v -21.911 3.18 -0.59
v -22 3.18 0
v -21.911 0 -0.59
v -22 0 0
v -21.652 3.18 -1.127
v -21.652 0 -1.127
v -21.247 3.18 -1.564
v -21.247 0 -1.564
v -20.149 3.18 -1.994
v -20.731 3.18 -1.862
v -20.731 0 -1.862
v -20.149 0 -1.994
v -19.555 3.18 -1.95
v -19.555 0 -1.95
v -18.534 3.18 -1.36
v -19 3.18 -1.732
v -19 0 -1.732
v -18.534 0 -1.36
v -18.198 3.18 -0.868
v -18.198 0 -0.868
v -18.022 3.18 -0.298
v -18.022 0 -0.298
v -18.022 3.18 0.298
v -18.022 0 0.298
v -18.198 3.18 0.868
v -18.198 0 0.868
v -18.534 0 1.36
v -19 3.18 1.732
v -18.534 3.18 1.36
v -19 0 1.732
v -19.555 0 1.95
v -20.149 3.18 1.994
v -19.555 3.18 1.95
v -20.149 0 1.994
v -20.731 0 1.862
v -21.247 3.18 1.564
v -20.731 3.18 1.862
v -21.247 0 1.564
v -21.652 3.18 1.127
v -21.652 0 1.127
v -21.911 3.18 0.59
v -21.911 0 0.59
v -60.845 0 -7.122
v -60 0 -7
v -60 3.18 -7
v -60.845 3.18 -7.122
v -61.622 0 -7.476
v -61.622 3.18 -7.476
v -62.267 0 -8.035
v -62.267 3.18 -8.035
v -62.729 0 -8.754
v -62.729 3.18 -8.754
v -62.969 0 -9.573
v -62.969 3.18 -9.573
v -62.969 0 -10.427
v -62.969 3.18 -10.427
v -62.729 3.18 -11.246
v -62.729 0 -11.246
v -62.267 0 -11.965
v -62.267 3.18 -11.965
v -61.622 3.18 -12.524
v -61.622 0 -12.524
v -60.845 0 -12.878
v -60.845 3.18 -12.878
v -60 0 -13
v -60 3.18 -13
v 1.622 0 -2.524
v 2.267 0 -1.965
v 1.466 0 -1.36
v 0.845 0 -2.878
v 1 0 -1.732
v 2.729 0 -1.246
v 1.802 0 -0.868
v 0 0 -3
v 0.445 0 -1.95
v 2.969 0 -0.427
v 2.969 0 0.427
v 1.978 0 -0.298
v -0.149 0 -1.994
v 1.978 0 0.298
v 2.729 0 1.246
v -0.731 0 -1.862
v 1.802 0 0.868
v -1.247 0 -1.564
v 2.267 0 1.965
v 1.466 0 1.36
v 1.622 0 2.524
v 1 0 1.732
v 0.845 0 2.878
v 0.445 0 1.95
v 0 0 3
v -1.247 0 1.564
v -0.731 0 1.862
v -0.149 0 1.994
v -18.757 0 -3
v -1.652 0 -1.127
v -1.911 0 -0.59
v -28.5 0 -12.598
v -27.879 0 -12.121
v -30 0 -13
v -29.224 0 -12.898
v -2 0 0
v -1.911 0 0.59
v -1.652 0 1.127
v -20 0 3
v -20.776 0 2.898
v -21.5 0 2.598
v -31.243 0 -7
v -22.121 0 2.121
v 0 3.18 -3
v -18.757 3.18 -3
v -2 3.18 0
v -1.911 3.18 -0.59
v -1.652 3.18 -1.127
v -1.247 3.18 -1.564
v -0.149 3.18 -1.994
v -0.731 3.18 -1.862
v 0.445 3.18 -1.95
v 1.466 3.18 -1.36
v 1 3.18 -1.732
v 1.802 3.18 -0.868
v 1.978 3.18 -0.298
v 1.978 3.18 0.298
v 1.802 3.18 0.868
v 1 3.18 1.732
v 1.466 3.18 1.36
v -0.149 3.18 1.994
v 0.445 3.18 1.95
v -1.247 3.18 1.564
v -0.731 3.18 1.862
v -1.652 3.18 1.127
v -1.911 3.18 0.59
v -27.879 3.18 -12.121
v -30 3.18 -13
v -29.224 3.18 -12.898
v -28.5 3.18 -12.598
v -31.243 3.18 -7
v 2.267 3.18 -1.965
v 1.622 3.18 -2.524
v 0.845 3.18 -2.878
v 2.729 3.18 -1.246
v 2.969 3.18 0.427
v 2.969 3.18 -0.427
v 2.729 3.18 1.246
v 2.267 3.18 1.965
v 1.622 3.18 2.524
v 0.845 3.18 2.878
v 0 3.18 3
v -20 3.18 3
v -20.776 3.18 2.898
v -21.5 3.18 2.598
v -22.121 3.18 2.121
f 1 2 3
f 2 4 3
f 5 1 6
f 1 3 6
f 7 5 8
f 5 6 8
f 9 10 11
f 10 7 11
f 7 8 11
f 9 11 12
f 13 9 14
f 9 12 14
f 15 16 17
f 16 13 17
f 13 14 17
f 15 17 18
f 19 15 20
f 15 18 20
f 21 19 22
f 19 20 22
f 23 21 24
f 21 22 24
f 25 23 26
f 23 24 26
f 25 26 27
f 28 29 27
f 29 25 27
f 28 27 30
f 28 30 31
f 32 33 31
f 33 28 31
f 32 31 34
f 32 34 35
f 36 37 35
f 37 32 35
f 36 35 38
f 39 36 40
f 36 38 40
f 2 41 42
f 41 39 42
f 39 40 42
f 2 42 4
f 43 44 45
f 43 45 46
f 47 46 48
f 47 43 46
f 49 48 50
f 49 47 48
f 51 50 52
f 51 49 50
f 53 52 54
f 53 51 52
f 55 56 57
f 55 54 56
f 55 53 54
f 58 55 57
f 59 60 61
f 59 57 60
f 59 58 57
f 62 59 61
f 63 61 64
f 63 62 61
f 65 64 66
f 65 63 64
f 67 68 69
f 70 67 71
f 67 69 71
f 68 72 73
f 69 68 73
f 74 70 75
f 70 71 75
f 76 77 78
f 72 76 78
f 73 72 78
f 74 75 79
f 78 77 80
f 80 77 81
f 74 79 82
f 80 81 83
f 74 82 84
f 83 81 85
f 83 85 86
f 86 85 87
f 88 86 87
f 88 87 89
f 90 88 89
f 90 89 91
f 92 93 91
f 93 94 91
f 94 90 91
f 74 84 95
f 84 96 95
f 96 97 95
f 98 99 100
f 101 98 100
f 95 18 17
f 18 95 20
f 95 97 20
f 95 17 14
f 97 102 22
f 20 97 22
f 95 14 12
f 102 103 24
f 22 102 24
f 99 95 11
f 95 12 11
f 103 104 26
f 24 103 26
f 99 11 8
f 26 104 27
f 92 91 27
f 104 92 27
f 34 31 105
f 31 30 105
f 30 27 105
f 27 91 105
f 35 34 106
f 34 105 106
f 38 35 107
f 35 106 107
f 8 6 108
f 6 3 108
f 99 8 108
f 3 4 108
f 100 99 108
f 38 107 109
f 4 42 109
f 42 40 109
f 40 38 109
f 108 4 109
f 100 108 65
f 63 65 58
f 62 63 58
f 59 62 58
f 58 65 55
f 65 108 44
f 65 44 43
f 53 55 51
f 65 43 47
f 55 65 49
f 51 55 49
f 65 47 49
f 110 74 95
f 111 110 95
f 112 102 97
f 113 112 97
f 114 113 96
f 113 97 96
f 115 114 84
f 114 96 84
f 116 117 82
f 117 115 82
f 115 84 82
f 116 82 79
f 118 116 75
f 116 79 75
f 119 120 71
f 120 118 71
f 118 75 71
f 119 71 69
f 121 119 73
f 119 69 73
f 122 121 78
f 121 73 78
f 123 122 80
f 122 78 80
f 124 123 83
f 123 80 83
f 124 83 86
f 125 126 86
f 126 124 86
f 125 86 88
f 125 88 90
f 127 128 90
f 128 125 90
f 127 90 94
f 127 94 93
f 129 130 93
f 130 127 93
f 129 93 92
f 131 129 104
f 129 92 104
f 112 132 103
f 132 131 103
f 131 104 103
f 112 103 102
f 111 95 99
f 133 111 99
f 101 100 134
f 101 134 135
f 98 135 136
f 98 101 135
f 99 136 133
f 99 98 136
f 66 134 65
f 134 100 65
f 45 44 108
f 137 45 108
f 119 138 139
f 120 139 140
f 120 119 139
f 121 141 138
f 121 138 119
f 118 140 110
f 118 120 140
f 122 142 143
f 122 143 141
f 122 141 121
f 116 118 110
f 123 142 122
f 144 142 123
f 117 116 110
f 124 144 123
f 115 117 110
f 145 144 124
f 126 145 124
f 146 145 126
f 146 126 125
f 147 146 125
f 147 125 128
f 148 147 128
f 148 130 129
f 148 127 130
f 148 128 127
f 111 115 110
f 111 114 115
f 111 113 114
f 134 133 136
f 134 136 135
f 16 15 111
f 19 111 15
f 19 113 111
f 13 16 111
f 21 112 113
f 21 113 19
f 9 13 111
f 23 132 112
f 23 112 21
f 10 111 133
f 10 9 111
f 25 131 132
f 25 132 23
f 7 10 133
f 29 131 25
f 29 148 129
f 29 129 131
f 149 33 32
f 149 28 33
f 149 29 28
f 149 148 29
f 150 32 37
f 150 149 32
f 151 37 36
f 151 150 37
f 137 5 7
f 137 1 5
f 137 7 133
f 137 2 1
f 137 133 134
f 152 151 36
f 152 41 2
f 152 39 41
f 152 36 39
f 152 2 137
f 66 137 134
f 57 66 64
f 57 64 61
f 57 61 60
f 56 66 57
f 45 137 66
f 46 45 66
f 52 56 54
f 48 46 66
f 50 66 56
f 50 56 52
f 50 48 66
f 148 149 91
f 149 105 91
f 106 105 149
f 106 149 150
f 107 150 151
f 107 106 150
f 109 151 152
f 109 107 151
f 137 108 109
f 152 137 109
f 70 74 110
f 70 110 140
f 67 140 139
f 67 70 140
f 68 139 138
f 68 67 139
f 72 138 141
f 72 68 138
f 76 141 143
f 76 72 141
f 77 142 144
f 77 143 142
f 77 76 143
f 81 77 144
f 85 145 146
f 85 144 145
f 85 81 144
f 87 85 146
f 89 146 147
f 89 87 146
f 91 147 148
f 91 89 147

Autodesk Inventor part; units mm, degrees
ref_plane "YZ Plane" through (0, 0, 0) normal (1, 0, 0) x (0, 1, 0)
ref_plane "XZ Plane" through (0, 0, 0) normal (0, 1, 0) x (-1, 0, 0)
ref_plane "XY Plane" through (0, 0, 0) normal (0, 0, 1) x (1, 0, 0)
sketch "Boceto1" plane through (0, 0, 0) normal (0, 1, 0) x (-1, 0, 0)
  circle A0 centre (0, 0) radius 2
  line L0 (0, 0) -> (20, 0) construction
  line L1 (0, -3) -> (20, -3)
  line L2 (20, 3) -> (0, 3)
  arc A1 (0, 3) -> (0, -3) centre (0, 0) ccw
  arc A2 (20, -3) -> (20, 3) centre (20, 0) ccw
  circle A3 centre (20, 0) radius 2
  line L3 (20, 0) -> (30, -10) construction
  line L4 (17.8787, -2.1213) -> (27.8787, -12.1213)
  line L5 (32.1213, -7.8787) -> (22.1213, 2.1213)
  arc A4 (22.1213, 2.1213) -> (17.8787, -2.1213) centre (20, 0) ccw
  arc A5 (27.8787, -12.1213) -> (32.1213, -7.8787) centre (30, -10) ccw
  line L6 (30, -10) -> (60, -10) construction
  line L7 (30, -13) -> (60, -13)
  line L8 (60, -7) -> (30, -7)
  arc A6 (30, -7) -> (30, -13) centre (30, -10) ccw
  arc A7 (60, -13) -> (60, -7) centre (60, -10) ccw
  point P0 (10, 0)
  point P1 (25, -5)
  point P2 (45, -10)
  dimension "d0" = 4
  dimension "d1" = 6
  dimension "d2" = 20
  dimension "d3" = 4
  dimension "d4" = 6
  dimension "d5" = 5
  dimension "d6" = 5
  dimension "d7" = 6
  dimension "d8" = 30
extrude "Extrusión1" add sketch "Boceto1" along normal blind 3.18
properties part number "PINZA_DEDO"
